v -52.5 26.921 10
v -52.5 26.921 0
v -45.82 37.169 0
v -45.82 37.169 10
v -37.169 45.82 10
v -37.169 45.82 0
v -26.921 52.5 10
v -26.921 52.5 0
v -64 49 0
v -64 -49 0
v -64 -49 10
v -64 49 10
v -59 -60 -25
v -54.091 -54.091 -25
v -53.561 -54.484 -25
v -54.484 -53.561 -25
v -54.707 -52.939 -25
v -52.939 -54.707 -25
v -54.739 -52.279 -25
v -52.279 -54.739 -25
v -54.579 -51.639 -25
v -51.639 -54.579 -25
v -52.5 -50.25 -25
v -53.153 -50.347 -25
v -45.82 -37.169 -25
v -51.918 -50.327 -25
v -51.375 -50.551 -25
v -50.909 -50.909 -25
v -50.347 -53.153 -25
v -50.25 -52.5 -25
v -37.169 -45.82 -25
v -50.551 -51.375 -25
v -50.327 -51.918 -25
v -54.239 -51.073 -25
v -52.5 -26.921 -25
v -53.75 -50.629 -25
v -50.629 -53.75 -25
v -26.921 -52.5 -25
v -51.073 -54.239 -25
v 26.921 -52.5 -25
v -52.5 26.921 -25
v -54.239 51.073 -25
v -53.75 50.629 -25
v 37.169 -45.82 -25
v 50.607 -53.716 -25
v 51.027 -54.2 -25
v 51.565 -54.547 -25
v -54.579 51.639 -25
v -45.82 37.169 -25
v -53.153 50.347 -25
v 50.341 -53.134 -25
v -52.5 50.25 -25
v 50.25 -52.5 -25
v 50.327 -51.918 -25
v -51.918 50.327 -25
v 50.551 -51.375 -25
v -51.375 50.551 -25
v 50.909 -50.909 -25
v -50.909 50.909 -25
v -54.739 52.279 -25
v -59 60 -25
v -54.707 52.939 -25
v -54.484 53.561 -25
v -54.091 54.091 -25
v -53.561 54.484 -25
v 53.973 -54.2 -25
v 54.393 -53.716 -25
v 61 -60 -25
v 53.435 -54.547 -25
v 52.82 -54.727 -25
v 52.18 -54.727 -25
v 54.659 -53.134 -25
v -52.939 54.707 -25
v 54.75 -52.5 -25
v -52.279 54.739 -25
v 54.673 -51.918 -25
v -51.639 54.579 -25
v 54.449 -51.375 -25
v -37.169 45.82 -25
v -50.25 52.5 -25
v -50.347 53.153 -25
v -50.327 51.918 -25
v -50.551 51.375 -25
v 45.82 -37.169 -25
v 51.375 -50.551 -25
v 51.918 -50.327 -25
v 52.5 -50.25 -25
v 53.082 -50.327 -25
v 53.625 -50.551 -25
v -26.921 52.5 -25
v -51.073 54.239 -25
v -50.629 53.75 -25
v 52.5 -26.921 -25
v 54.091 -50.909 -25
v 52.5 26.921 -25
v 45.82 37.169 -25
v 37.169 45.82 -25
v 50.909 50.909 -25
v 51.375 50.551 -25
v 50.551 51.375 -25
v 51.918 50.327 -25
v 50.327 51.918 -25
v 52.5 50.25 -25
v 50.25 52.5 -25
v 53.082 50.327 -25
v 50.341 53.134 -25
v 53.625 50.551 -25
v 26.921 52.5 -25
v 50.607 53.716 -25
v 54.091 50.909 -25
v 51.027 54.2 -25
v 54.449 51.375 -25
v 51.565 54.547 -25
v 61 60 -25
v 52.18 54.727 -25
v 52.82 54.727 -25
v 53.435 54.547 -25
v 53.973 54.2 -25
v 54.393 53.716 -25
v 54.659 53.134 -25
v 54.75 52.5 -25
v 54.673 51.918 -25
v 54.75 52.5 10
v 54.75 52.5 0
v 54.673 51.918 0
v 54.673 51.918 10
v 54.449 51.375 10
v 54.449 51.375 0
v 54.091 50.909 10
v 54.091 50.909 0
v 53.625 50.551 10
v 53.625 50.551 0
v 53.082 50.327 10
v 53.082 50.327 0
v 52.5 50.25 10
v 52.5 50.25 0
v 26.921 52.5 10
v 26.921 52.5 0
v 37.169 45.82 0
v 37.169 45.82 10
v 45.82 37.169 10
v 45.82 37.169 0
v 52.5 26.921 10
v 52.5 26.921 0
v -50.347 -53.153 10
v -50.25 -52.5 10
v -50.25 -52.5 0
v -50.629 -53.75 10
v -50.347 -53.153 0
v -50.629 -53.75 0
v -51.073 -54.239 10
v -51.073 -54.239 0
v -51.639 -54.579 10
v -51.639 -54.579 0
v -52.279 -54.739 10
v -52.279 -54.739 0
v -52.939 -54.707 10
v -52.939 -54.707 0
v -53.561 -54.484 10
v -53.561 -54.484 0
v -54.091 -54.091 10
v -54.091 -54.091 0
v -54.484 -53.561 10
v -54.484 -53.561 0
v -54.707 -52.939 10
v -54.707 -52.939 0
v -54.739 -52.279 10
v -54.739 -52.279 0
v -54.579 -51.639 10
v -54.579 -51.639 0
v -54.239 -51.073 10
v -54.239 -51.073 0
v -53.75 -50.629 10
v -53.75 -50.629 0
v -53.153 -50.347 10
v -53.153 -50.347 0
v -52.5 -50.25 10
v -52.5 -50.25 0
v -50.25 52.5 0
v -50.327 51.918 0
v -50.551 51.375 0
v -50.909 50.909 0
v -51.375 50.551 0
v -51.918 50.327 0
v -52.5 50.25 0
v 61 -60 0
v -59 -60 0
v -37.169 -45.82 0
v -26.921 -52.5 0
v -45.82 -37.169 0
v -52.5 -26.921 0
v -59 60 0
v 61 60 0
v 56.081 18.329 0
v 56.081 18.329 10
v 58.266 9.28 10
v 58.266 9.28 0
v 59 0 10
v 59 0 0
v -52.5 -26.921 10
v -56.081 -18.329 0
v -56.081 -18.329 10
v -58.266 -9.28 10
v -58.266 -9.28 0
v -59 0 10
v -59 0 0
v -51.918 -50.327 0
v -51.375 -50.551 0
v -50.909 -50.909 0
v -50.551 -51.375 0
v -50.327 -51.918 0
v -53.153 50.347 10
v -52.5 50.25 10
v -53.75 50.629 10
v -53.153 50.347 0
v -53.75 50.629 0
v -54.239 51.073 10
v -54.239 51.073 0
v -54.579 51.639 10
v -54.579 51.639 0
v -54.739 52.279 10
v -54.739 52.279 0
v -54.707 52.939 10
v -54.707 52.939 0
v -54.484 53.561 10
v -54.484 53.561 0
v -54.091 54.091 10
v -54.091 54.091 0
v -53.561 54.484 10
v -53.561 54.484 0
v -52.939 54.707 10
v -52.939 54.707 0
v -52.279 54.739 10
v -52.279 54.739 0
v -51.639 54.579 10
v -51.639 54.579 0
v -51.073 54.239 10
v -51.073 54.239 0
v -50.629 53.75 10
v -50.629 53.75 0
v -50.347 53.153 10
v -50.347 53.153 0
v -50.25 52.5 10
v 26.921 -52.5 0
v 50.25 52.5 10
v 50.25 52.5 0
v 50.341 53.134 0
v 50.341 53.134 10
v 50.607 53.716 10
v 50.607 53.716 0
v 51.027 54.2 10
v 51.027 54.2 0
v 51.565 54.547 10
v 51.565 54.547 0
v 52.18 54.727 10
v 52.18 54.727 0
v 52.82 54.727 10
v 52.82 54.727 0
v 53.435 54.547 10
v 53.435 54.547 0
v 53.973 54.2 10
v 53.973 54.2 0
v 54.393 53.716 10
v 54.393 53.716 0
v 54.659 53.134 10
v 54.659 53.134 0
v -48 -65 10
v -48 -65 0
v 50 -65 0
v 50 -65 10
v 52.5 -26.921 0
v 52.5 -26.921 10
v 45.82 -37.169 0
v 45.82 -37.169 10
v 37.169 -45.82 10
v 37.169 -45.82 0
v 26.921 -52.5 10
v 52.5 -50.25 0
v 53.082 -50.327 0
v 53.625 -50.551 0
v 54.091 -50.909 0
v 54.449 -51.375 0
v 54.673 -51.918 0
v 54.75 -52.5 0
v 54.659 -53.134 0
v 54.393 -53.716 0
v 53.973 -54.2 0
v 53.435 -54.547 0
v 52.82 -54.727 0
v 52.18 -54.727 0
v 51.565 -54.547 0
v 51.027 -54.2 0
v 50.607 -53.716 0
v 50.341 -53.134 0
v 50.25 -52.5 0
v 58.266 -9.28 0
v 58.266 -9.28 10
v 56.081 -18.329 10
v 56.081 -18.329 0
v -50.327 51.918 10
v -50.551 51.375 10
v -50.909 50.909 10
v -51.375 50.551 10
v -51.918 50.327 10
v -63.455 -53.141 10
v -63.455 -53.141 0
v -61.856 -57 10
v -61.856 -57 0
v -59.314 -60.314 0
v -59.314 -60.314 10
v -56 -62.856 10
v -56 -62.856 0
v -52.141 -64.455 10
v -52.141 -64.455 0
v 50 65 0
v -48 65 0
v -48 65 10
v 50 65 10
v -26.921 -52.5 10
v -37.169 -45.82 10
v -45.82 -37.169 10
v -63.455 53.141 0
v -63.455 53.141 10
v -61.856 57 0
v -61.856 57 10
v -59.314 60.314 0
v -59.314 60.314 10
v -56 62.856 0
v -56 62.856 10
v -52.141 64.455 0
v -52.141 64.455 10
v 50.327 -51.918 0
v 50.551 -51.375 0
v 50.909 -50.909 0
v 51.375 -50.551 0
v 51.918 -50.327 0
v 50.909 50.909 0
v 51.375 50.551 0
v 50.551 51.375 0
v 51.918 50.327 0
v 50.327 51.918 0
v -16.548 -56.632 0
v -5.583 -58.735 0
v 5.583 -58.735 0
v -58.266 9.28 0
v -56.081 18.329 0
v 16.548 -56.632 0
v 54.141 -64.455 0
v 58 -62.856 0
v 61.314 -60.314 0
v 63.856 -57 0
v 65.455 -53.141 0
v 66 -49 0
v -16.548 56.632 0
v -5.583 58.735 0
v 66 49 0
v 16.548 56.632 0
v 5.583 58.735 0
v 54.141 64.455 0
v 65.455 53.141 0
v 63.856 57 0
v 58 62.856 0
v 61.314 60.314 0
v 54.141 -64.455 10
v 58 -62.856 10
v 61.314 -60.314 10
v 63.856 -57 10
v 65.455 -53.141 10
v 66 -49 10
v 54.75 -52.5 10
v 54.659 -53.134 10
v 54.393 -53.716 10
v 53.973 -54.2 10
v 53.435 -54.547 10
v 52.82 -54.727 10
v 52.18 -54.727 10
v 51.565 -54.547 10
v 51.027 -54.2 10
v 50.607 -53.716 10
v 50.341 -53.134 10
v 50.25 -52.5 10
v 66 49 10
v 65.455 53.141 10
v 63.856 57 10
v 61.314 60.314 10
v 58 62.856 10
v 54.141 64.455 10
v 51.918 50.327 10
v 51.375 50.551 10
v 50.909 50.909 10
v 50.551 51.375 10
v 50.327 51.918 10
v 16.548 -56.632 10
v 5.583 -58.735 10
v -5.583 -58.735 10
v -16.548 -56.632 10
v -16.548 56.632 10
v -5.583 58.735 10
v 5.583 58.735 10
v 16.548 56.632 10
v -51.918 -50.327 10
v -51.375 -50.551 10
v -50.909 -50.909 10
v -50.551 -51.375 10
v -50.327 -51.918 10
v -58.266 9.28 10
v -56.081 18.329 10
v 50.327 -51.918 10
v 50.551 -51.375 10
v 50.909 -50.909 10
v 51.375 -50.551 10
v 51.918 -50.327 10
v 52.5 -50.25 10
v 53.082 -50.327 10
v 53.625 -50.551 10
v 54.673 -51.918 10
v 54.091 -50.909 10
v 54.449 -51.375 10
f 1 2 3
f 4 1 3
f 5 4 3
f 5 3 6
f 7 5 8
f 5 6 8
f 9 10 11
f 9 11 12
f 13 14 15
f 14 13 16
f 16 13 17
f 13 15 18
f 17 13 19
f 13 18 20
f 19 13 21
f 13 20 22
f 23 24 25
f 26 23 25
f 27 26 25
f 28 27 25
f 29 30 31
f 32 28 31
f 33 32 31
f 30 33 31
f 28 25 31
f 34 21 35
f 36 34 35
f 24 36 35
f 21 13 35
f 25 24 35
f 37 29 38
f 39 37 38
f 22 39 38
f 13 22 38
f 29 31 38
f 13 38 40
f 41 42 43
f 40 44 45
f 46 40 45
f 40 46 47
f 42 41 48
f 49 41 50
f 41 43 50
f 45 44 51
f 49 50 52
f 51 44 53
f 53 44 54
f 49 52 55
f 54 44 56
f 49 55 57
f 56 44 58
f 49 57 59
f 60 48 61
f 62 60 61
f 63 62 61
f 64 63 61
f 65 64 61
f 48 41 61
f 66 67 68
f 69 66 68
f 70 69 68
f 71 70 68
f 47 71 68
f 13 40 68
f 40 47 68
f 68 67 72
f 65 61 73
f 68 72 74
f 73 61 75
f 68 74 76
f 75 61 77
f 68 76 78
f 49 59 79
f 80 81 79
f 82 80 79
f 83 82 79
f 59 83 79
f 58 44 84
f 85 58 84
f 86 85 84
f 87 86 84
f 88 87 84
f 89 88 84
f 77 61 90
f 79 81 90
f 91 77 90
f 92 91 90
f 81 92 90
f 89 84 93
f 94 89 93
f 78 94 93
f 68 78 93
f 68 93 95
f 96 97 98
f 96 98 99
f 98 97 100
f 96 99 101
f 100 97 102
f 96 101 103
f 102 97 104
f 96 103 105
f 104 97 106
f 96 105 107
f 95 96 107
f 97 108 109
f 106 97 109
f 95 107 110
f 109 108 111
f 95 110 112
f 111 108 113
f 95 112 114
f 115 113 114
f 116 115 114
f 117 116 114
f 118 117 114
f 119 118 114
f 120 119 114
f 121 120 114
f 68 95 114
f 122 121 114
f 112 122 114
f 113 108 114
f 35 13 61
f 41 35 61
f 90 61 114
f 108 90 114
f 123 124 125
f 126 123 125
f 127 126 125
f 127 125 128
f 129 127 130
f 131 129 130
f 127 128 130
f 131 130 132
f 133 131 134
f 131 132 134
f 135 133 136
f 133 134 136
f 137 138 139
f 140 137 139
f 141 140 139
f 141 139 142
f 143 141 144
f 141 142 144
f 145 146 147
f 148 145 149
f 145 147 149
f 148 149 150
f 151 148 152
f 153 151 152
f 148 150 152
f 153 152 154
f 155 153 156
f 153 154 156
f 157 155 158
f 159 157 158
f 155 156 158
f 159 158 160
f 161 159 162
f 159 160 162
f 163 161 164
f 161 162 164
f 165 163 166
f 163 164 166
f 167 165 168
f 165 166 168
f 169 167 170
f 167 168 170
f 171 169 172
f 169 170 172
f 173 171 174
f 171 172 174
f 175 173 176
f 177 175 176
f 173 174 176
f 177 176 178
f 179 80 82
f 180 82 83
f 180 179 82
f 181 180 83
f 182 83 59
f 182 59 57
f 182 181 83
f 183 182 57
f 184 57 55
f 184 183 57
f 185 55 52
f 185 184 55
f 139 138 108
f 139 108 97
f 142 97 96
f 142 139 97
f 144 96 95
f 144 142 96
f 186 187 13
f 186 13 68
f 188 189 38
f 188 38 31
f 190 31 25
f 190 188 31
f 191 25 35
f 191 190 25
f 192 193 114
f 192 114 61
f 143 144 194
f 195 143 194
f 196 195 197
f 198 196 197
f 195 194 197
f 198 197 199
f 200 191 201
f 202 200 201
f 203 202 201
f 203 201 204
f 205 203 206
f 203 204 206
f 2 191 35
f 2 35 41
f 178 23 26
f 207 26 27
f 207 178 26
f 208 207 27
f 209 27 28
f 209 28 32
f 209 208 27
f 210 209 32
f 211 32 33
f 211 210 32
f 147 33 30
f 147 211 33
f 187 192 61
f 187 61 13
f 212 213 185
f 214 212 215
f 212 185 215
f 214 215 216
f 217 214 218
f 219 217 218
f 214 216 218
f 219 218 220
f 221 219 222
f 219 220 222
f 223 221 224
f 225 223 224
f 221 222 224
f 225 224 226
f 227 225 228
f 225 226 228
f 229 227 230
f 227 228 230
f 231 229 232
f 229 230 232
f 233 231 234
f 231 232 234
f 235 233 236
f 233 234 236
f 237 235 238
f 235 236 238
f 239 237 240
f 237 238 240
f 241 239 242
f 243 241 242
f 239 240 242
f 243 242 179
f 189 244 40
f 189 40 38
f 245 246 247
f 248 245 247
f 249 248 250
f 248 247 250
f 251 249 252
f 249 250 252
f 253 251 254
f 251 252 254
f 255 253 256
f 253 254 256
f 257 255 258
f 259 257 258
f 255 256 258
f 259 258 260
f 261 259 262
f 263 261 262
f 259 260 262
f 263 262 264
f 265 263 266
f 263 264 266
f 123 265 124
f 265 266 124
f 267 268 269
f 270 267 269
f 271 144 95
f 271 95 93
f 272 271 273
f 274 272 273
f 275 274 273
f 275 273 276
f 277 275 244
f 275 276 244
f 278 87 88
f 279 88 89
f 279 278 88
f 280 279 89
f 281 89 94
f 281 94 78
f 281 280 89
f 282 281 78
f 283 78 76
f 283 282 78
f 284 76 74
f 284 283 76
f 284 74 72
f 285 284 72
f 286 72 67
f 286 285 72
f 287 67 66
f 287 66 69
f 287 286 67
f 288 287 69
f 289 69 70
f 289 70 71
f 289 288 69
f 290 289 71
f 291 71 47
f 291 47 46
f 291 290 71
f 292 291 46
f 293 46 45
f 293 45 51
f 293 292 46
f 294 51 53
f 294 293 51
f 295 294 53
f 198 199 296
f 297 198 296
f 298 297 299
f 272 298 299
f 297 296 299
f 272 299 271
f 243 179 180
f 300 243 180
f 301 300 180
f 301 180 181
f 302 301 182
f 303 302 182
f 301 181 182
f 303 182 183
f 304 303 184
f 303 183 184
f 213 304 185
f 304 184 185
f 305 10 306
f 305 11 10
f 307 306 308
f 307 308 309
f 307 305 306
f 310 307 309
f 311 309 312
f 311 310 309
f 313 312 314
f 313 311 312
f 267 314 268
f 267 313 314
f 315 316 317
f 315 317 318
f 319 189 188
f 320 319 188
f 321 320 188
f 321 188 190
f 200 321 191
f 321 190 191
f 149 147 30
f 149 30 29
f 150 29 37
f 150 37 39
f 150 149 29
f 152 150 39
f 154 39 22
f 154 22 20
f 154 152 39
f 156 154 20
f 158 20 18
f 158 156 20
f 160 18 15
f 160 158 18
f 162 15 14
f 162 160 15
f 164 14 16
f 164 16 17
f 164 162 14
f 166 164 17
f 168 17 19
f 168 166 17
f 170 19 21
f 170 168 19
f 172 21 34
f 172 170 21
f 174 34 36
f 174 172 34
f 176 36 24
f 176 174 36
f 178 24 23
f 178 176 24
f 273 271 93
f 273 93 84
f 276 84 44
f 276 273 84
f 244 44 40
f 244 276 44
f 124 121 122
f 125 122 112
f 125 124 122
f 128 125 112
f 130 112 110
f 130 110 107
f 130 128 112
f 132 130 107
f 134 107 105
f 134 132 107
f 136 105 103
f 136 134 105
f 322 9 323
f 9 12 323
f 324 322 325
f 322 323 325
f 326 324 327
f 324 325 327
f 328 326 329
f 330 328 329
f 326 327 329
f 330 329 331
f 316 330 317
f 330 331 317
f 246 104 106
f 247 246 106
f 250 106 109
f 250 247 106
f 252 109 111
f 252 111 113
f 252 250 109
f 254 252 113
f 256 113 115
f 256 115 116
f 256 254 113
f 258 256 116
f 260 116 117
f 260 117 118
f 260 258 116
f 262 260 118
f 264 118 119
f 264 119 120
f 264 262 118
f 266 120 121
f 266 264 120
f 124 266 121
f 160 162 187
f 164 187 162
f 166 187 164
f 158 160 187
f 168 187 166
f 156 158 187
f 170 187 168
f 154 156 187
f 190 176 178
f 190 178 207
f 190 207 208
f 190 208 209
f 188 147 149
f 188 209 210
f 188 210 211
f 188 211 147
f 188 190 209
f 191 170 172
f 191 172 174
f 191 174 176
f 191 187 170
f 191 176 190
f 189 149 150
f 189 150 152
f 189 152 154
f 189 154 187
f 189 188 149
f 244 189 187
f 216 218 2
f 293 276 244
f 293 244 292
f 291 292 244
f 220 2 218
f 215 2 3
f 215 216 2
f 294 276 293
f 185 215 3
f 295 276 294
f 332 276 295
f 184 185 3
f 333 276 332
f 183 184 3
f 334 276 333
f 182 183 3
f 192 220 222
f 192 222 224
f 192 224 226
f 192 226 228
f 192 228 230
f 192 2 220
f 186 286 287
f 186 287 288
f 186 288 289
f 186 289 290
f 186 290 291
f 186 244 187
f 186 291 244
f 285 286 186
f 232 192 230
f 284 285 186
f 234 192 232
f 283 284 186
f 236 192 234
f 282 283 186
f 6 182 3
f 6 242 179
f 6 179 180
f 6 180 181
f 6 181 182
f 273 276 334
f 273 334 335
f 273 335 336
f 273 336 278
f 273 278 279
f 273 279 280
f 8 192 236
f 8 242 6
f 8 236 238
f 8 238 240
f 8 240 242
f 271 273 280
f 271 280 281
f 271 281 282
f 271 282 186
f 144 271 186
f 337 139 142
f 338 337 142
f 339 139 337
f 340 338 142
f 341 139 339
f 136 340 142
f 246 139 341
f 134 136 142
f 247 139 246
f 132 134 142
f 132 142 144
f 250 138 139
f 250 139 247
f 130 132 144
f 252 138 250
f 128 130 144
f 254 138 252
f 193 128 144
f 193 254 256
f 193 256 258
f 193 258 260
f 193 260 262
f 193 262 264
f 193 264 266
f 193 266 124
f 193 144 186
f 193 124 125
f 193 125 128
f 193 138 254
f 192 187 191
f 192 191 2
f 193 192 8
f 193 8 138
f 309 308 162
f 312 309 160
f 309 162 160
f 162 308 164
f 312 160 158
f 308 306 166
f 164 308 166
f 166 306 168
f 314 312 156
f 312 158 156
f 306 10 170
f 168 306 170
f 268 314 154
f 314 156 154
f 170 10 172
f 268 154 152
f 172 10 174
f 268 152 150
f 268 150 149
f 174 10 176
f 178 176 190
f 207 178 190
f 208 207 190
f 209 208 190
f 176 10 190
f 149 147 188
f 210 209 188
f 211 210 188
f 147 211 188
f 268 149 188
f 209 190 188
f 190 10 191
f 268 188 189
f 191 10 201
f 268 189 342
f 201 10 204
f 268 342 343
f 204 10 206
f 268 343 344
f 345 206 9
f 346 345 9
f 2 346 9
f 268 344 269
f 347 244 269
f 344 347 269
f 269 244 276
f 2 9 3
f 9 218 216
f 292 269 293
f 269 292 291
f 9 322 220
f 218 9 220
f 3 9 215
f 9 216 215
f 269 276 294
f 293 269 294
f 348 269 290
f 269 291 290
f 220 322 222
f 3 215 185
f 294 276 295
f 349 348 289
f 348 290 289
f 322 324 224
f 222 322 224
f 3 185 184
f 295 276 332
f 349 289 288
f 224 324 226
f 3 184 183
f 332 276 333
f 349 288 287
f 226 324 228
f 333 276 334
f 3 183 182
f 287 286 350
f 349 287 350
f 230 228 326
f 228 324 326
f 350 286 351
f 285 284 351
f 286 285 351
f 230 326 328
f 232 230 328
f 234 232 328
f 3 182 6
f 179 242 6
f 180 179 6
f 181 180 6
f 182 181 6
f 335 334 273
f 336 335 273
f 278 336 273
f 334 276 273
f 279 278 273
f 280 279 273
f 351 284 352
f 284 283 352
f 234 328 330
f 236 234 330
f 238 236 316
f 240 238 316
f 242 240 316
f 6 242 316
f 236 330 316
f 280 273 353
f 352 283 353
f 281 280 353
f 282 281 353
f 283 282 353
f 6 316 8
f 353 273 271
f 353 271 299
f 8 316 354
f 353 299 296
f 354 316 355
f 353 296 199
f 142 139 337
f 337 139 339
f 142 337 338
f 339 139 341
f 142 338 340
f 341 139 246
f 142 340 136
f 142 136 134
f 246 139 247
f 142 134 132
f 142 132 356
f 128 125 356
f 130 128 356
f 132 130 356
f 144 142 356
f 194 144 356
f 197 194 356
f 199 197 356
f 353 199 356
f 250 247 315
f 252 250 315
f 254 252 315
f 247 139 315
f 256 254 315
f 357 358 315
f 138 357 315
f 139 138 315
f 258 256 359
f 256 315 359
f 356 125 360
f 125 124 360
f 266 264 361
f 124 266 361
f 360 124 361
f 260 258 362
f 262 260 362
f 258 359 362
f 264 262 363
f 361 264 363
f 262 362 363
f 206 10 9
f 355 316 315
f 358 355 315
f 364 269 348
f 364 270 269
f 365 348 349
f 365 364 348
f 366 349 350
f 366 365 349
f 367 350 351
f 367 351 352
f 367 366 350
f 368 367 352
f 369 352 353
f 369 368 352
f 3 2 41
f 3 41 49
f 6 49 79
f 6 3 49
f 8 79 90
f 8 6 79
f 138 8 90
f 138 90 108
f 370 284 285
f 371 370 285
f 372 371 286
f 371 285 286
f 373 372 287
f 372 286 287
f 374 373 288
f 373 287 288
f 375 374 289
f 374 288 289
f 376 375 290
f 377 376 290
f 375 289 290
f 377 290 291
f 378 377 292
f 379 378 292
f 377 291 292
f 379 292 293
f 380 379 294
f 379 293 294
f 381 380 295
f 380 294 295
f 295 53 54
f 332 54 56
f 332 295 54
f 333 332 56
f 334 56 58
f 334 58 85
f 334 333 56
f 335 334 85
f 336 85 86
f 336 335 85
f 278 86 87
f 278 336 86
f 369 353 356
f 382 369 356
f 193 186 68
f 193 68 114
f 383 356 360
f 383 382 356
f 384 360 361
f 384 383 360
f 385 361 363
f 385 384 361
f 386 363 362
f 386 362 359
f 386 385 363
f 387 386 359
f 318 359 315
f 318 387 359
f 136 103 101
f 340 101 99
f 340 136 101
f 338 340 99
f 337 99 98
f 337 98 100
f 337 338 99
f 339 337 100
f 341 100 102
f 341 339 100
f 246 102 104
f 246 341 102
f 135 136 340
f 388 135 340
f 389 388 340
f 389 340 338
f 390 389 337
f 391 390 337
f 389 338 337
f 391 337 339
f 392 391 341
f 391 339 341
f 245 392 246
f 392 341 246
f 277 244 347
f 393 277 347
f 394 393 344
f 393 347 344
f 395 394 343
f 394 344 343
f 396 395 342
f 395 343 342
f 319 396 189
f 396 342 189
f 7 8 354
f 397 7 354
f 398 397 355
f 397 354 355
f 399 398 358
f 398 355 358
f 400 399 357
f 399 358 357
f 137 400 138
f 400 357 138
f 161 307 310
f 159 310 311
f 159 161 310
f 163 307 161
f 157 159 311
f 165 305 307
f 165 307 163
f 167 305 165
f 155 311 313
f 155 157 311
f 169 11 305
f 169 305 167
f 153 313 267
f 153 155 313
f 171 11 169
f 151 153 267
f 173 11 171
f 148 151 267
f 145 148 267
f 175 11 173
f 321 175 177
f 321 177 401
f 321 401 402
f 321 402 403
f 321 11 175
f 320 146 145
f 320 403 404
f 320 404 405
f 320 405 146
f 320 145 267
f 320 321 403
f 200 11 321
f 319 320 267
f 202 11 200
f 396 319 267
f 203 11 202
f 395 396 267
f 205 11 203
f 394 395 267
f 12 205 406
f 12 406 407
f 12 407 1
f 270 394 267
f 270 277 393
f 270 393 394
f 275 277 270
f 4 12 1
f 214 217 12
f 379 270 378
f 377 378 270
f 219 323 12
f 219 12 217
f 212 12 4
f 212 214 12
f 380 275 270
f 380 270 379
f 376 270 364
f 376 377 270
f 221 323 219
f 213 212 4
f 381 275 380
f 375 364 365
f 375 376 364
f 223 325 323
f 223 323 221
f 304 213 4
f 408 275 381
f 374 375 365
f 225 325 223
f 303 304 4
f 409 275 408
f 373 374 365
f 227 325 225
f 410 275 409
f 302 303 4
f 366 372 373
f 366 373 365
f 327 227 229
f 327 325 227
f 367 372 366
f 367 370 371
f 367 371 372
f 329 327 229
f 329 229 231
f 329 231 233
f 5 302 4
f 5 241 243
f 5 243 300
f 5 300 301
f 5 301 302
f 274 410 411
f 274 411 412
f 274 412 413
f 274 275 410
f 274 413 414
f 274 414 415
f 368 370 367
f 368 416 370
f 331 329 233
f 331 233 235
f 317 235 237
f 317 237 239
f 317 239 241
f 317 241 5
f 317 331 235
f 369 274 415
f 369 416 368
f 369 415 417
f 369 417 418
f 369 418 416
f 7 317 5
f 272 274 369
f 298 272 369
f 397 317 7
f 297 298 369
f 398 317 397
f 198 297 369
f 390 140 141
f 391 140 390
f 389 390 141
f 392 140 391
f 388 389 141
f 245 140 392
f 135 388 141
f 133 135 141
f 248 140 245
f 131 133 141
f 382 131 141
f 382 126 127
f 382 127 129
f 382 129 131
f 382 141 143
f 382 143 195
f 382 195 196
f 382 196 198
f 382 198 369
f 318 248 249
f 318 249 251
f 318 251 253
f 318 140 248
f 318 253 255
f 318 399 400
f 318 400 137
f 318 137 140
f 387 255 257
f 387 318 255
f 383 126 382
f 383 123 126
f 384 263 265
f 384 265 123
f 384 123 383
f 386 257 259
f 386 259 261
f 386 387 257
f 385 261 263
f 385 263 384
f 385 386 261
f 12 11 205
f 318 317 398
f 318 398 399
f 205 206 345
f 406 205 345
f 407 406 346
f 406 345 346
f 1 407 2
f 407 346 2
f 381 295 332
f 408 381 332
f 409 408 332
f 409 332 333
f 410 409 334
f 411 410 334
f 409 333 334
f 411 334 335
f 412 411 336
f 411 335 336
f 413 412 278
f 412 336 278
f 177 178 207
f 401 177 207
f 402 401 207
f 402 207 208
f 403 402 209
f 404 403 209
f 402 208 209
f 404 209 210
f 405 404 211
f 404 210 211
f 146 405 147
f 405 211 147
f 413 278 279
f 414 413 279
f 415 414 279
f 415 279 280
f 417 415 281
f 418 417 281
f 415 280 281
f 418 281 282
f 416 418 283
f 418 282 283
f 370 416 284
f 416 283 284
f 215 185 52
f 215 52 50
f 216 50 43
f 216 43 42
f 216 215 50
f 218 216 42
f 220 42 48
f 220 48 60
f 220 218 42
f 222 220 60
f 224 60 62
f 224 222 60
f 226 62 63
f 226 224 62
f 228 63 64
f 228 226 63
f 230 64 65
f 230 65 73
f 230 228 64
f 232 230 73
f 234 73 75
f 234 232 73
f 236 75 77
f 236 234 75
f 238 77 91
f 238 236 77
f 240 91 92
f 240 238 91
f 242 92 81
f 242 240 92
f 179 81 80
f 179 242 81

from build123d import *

# Parameters (mm, degrees)
F1_DEPTH = 25
F0_W     = 130
F0_H     = 130
F2_DEPTH = 10
F3_R     = 16


with BuildPart() as f1:
    # F0 (on Top) → F1 (new body)
    with BuildSketch(Plane.XY):
        Polygon((-59, -4.01e-08), (-59, -59.9999837577), (61, -59.9999837577), (61, 60.0000162423), (-59, 60.0000162423), align=None)
        with BuildLine():
            ThreePointArc((-52.5, -26.9211812519), (-57.351983396, -13.8473824436), (-59, -4.01e-08))
            ThreePointArc((-59, -4.01e-08), (-57.3519834055, 13.8473824047), (-52.5, 26.9211812519))
            Line((-52.5, 26.9211812519), (-52.5, 50.25))
            ThreePointArc((-52.5, 50.25), (-54.0909902577, 54.0909902577), (-50.25, 52.5))
            Line((-50.25, 52.5), (-26.9211812519, 52.5))
            ThreePointArc((-26.9211812519, 52.5), (0, 59), (26.9211812519, 52.5))
            Line((26.9211812519, 52.5), (50.25, 52.5))
            ThreePointArc((50.25, 52.5), (52.5, 54.75), (54.75, 52.5))
            ThreePointArc((54.75, 52.5), (54.0909902577, 50.9090097423), (52.5, 50.25))
            Line((52.5, 50.25), (52.5, 26.9211812519))
            ThreePointArc((52.5, 26.9211812519), (57.3519834008, 13.8473824241), (59, 0))
            ThreePointArc((59, 0), (57.3519834008, -13.8473824241), (52.5, -26.9211812519))
            Line((52.5, -26.9211812519), (52.5, -50.25))
            ThreePointArc((52.5, -50.25), (54.0909902577, -50.9090097423), (54.75, -52.5))
            ThreePointArc((54.75, -52.5), (52.5, -54.75), (50.25, -52.5))
            Line((50.25, -52.5), (26.9211812519, -52.5))
            ThreePointArc((26.9211812519, -52.5), (0, -59), (-26.9211812519, -52.5))
            Line((-26.9211812519, -52.5), (-50.25, -52.5))
            ThreePointArc((-50.25, -52.5), (-54.0909902577, -54.0909902577), (-52.5, -50.25))
            Line((-52.5, -50.25), (-52.5, -26.9211812519))
        make_face(mode=Mode.SUBTRACT)
        with BuildLine():
            Line((-52.5, 50.25), (-52.5, 26.9211812519))
            ThreePointArc((-52.5, 26.9211812519), (-41.71930009, 41.71930009), (-26.9211812519, 52.5))
            Line((-26.9211812519, 52.5), (-50.25, 52.5))
            ThreePointArc((-50.25, 52.5), (-50.9090097423, 50.9090097423), (-52.5, 50.25))
        make_face()
        with BuildLine():
            ThreePointArc((-26.9211812519, -52.5), (-41.71930009, -41.71930009), (-52.5, -26.9211812519))
            Line((-52.5, -26.9211812519), (-52.5, -50.25))
            ThreePointArc((-52.5, -50.25), (-50.9090097423, -50.9090097423), (-50.25, -52.5))
            Line((-50.25, -52.5), (-26.9211812519, -52.5))
        make_face()
        with BuildLine():
            Line((50.25, 52.5), (26.9211812519, 52.5))
            ThreePointArc((26.9211812519, 52.5), (41.71930009, 41.71930009), (52.5, 26.9211812519))
            Line((52.5, 26.9211812519), (52.5, 50.25))
            ThreePointArc((52.5, 50.25), (50.9090097423, 50.9090097423), (50.25, 52.5))
        make_face()
        with BuildLine():
            ThreePointArc((52.5, -26.9211812519), (41.71930009, -41.71930009), (26.9211812519, -52.5))
            Line((26.9211812519, -52.5), (50.25, -52.5))
            ThreePointArc((50.25, -52.5), (50.9090097423, -50.9090097423), (52.5, -50.25))
            Line((52.5, -50.25), (52.5, -26.9211812519))
        make_face()
        with BuildLine():
            Line((26.9211812519, -52.5), (-26.9211812519, -52.5))
            ThreePointArc((-26.9211812519, -52.5), (0, -59), (26.9211812519, -52.5))
        make_face()
        with BuildLine():
            ThreePointArc((26.9211812519, 52.5), (0, 59), (-26.9211812519, 52.5))
            Line((-26.9211812519, 52.5), (26.9211812519, 52.5))
        make_face()
        with BuildLine():
            ThreePointArc((59, 0), (57.3519834008, 13.8473824241), (52.5, 26.9211812519))
            Line((52.5, 26.9211812519), (52.5, -26.9211812519))
            ThreePointArc((52.5, -26.9211812519), (57.3519834008, -13.8473824241), (59, 0))
        make_face()
        with BuildLine():
            ThreePointArc((-52.5, 26.9211812519), (-57.3519834055, 13.8473824047), (-59, -4.01e-08))
            ThreePointArc((-59, -4.01e-08), (-57.351983396, -13.8473824436), (-52.5, -26.9211812519))
            Line((-52.5, -26.9211812519), (-52.5, 26.9211812519))
        make_face()
    extrude(amount=-F1_DEPTH)


with BuildPart() as f2:
    # F0 (on Top) → F2 (new body)
    with BuildSketch(Plane.XY):
        with Locations((1, 1.62423e-05)):
            Rectangle(F0_W, F0_H)
        Polygon((61, -59.9999837577), (-59, -59.9999837577), (-59, -4.01e-08), (-59, 60.0000162423), (61, 60.0000162423), align=None, mode=Mode.SUBTRACT)
        Polygon((-59, -4.01e-08), (-59, -59.9999837577), (61, -59.9999837577), (61, 60.0000162423), (-59, 60.0000162423), align=None)
        with BuildLine():
            ThreePointArc((-52.5, -26.9211812519), (-57.351983396, -13.8473824436), (-59, -4.01e-08))
            ThreePointArc((-59, -4.01e-08), (-57.3519834055, 13.8473824047), (-52.5, 26.9211812519))
            Line((-52.5, 26.9211812519), (-52.5, 50.25))
            ThreePointArc((-52.5, 50.25), (-54.0909902577, 54.0909902577), (-50.25, 52.5))
            Line((-50.25, 52.5), (-26.9211812519, 52.5))
            ThreePointArc((-26.9211812519, 52.5), (0, 59), (26.9211812519, 52.5))
            Line((26.9211812519, 52.5), (50.25, 52.5))
            ThreePointArc((50.25, 52.5), (52.5, 54.75), (54.75, 52.5))
            ThreePointArc((54.75, 52.5), (54.0909902577, 50.9090097423), (52.5, 50.25))
            Line((52.5, 50.25), (52.5, 26.9211812519))
            ThreePointArc((52.5, 26.9211812519), (57.3519834008, 13.8473824241), (59, 0))
            ThreePointArc((59, 0), (57.3519834008, -13.8473824241), (52.5, -26.9211812519))
            Line((52.5, -26.9211812519), (52.5, -50.25))
            ThreePointArc((52.5, -50.25), (54.0909902577, -50.9090097423), (54.75, -52.5))
            ThreePointArc((54.75, -52.5), (52.5, -54.75), (50.25, -52.5))
            Line((50.25, -52.5), (26.9211812519, -52.5))
            ThreePointArc((26.9211812519, -52.5), (0, -59), (-26.9211812519, -52.5))
            Line((-26.9211812519, -52.5), (-50.25, -52.5))
            ThreePointArc((-50.25, -52.5), (-54.0909902577, -54.0909902577), (-52.5, -50.25))
            Line((-52.5, -50.25), (-52.5, -26.9211812519))
        make_face(mode=Mode.SUBTRACT)
        with BuildLine():
            Line((-52.5, 50.25), (-52.5, 26.9211812519))
            ThreePointArc((-52.5, 26.9211812519), (-41.71930009, 41.71930009), (-26.9211812519, 52.5))
            Line((-26.9211812519, 52.5), (-50.25, 52.5))
            ThreePointArc((-50.25, 52.5), (-50.9090097423, 50.9090097423), (-52.5, 50.25))
        make_face()
        with BuildLine():
            Line((50.25, 52.5), (26.9211812519, 52.5))
            ThreePointArc((26.9211812519, 52.5), (41.71930009, 41.71930009), (52.5, 26.9211812519))
            Line((52.5, 26.9211812519), (52.5, 50.25))
            ThreePointArc((52.5, 50.25), (50.9090097423, 50.9090097423), (50.25, 52.5))
        make_face()
        with BuildLine():
            ThreePointArc((52.5, -26.9211812519), (41.71930009, -41.71930009), (26.9211812519, -52.5))
            Line((26.9211812519, -52.5), (50.25, -52.5))
            ThreePointArc((50.25, -52.5), (50.9090097423, -50.9090097423), (52.5, -50.25))
            Line((52.5, -50.25), (52.5, -26.9211812519))
        make_face()
        with BuildLine():
            ThreePointArc((-26.9211812519, -52.5), (-41.71930009, -41.71930009), (-52.5, -26.9211812519))
            Line((-52.5, -26.9211812519), (-52.5, -50.25))
            ThreePointArc((-52.5, -50.25), (-50.9090097423, -50.9090097423), (-50.25, -52.5))
            Line((-50.25, -52.5), (-26.9211812519, -52.5))
        make_face()
    extrude(amount=F2_DEPTH)

    # F3
    f3_edges = [f2.edges().sort_by_distance(p)[0] for p in [
        (-64, 65.000016, 5),
        (-64, -64.999984, 5),
        (66, -64.999984, 5),
        (66, 65.000016, 5),
    ]]
    fillet(f3_edges, radius=F3_R)


solid = Compound([f1.part, f2.part])
